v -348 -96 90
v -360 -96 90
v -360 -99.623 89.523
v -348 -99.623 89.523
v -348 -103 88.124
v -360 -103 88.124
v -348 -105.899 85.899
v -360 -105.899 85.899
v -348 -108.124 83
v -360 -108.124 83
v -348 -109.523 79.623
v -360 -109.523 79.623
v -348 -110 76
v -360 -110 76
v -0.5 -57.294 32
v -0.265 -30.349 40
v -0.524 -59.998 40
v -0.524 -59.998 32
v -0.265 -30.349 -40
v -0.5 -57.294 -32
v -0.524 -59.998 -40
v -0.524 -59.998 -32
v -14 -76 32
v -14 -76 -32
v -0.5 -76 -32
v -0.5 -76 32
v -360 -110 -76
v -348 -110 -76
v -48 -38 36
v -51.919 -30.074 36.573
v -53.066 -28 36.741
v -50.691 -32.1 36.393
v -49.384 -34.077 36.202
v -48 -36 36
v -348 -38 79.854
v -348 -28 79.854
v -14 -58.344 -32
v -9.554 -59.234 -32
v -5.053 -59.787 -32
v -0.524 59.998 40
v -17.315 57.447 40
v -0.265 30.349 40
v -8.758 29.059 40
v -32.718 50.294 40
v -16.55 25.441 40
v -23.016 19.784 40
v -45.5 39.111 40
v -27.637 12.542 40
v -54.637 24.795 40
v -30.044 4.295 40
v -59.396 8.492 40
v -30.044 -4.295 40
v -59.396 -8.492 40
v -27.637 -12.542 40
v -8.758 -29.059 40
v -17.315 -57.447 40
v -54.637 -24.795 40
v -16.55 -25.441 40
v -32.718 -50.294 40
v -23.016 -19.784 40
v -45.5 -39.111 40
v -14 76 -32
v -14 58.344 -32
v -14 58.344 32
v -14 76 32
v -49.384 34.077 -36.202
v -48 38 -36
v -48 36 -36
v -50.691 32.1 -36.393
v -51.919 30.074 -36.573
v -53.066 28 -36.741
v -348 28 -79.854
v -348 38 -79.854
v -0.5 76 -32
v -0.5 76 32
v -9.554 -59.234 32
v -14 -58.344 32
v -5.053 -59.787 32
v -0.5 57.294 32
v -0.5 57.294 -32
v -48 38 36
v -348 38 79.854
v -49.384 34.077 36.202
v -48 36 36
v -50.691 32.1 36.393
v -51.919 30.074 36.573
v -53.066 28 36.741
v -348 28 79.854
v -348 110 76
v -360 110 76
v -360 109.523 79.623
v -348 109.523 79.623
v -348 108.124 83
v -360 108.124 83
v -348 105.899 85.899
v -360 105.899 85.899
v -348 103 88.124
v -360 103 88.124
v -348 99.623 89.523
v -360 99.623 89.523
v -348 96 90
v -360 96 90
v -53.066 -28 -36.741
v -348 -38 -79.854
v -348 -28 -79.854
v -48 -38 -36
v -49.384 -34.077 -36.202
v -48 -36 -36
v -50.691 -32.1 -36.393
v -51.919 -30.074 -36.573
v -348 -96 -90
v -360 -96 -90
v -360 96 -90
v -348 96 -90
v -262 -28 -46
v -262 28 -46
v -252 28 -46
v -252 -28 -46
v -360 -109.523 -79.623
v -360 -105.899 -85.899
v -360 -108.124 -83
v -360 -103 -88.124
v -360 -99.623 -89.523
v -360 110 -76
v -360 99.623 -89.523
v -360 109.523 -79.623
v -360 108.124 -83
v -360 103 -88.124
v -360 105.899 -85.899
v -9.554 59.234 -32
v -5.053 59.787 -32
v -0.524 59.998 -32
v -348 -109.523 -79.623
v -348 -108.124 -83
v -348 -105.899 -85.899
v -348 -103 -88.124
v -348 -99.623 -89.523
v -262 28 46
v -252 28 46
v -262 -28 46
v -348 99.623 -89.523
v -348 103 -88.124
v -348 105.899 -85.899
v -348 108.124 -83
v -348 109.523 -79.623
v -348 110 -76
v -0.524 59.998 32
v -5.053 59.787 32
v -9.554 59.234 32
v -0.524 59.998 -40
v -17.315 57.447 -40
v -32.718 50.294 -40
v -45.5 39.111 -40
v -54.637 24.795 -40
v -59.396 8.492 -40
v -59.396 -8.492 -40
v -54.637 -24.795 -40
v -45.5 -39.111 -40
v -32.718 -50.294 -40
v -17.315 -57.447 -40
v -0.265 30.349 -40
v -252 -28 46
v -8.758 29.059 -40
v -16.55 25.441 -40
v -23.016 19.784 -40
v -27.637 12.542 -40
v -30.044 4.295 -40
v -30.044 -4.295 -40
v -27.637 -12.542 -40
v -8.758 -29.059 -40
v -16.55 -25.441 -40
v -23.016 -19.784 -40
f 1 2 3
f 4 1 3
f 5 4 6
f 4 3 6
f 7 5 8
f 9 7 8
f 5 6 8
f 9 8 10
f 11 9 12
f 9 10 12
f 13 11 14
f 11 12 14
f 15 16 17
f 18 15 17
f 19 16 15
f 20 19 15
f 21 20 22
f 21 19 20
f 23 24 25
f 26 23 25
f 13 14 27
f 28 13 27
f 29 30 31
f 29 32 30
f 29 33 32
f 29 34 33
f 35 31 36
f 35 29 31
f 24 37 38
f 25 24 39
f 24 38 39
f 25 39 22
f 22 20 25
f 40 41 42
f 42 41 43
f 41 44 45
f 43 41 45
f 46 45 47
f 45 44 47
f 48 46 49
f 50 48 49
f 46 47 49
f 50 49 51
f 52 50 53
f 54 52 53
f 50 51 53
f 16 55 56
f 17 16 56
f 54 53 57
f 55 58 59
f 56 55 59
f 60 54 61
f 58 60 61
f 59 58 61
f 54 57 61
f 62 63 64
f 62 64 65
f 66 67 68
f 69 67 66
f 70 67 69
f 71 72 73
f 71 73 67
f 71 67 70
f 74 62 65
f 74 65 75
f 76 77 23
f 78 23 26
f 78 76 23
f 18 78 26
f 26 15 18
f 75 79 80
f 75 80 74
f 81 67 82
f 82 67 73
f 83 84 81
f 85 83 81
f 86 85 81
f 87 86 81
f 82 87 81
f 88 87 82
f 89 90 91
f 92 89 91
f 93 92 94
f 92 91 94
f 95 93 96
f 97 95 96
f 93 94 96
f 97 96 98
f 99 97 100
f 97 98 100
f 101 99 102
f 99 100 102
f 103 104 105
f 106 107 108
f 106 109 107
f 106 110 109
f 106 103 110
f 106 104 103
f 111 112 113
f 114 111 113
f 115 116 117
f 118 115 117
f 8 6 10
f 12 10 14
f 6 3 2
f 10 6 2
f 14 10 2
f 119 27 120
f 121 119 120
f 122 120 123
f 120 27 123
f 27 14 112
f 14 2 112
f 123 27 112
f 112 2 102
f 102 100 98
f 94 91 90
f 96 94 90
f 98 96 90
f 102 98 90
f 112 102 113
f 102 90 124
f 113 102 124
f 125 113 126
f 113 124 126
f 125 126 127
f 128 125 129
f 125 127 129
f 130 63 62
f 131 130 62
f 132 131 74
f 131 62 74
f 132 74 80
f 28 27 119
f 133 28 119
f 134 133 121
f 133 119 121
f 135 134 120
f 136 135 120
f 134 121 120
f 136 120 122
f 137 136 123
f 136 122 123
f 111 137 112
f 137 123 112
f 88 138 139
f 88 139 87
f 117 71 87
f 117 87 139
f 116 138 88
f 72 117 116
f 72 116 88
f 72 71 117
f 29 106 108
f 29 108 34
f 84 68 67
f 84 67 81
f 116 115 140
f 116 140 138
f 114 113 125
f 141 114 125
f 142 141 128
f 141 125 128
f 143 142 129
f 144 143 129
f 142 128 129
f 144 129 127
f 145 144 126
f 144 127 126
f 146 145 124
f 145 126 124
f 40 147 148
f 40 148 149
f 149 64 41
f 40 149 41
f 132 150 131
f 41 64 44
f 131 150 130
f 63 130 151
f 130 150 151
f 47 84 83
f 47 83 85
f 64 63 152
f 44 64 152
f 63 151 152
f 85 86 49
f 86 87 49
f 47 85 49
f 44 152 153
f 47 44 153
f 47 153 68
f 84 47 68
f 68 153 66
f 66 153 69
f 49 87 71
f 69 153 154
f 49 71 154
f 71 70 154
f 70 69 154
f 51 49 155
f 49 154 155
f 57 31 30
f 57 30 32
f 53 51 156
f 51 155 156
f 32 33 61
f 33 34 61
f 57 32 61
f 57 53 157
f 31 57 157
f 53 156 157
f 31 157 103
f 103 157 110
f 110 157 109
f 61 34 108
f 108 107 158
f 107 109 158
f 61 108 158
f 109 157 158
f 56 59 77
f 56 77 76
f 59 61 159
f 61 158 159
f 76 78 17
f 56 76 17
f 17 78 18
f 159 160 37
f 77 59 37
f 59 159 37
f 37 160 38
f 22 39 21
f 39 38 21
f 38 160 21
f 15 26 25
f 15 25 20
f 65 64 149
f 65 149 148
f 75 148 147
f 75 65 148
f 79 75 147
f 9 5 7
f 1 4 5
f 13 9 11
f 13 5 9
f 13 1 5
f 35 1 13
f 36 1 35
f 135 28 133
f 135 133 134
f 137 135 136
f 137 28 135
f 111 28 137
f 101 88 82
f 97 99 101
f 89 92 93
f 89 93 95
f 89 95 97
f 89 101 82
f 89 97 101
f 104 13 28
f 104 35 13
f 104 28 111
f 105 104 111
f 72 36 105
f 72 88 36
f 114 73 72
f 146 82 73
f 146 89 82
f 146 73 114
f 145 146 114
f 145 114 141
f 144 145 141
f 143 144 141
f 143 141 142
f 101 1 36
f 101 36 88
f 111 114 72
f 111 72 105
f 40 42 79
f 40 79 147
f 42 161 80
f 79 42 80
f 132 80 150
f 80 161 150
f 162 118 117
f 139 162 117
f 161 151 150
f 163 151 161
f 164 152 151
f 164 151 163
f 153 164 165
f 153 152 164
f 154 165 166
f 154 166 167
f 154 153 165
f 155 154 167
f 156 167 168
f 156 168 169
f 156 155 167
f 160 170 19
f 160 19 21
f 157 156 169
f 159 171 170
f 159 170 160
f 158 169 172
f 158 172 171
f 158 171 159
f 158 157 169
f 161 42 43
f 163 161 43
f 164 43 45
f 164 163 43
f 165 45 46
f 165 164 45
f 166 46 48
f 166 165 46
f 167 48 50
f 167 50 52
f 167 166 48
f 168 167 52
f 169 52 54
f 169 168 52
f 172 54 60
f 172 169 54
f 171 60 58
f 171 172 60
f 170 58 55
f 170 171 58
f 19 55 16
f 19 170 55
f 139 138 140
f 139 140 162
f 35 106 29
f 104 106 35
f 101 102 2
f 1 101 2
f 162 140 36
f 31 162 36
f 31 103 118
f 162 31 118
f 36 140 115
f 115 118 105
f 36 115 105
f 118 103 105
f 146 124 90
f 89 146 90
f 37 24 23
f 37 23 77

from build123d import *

# Parameters (mm, degrees)
EXTRUDE_START         = -360
EXTRUDE_1_DEPTH       = 12
EXTRUDE_START_2       = 28
EXTRUDE_2_DEPTH       = 10
EXTRUDE_START_3       = -38
EXTRUDE_3_DEPTH       = 10
EXTRUDE_START_4       = -46
EXTRUDE_SKETCH_4_W    = 10
EXTRUDE_SKETCH_4_H    = 56
EXTRUDE_4_DEPTH       = 92
REVOLVE_PROFILE_1_W   = 29.65
REVOLVE_PROFILE_1_H   = 80
REVOLVE_1_ANGLE       = 179
REVOLVE_INDEX_1_ANGLE = 90.5
EXTRUDE_START_5       = -32
EXTRUDE_SKETCH_5_W    = 13.5
EXTRUDE_SKETCH_5_H    = 20
EXTRUDE_5_DEPTH       = 64
EXTRUDE_SKETCH_6_W    = 13.5
EXTRUDE_SKETCH_6_H    = 20
EXTRUDE_6_DEPTH       = 64


with BuildPart() as part:
    # Extrude sketch 1 → Extrude 1 (new body)
    with BuildSketch(Plane(origin=(0, 0, 0), x_dir=(0, 0, -1), z_dir=(1, 0, 0)).offset(EXTRUDE_START)):
        with BuildLine():
            Line((-90, 96), (-90, -96))
            ThreePointArc((-90, -96), (-85.899494937, -105.899494937), (-76, -110))
            Line((-76, -110), (76, -110))
            ThreePointArc((76, -110), (85.899494937, -105.899494937), (90, -96))
            Line((90, -96), (90, 96))
            ThreePointArc((90, 96), (85.899494937, 105.899494937), (76, 110))
            Line((76, 110), (-76, 110))
            ThreePointArc((-76, 110), (-85.899494937, 105.899494937), (-90, 96))
        make_face()
    extrude(amount=EXTRUDE_1_DEPTH)


with BuildPart() as body_2:
    # Extrude sketch 2 → Extrude 2 (new body)
    with BuildSketch(Plane(origin=(0, 0, 0), x_dir=(1, 0, 0), z_dir=(0, 1, 0)).offset(EXTRUDE_START_2)):
        Polygon((-349, 80), (-48, 36), (-48, -36), (-349, -80), align=None)
    extrude(amount=EXTRUDE_2_DEPTH)


with BuildPart() as body_3:
    # Extrude sketch 3 → Extrude 3 (new body)
    with BuildSketch(Plane(origin=(0, 0, 0), x_dir=(1, 0, 0), z_dir=(0, 1, 0)).offset(EXTRUDE_START_3)):
        Polygon((-349, 80), (-48, 36), (-48, -36), (-349, -80), align=None)
    extrude(amount=EXTRUDE_3_DEPTH)


with BuildPart() as body_4:
    # Extrude sketch 4 → Extrude 4 (new body)
    with BuildSketch(Plane.XY.offset(EXTRUDE_START_4)):
        with Locations((-257, 0)):
            Rectangle(EXTRUDE_SKETCH_4_W, EXTRUDE_SKETCH_4_H)
    extrude(amount=EXTRUDE_4_DEPTH)


with BuildPart() as body_5:
    # Revolve profile 1 → Revolve 1 (revolve)
    with BuildSketch(Plane(origin=(0, 0, 0), x_dir=(1, 0, 0), z_dir=(0, 1, 0))):
        with Locations((45.175, 0)):
            Rectangle(REVOLVE_PROFILE_1_W, REVOLVE_PROFILE_1_H)
    revolve(axis=Axis((0, 0, -45), (0, 0, 1)), revolution_arc=REVOLVE_1_ANGLE)


with BuildPart() as body_5_1:
    # Revolve index 1: moved
    add(body_5.part.rotate(Axis((0, 0, 0), (0, 0, 1)), REVOLVE_INDEX_1_ANGLE))


with BuildPart() as body_6:
    # Extrude sketch 5 → Extrude 5 (new body)
    with BuildSketch(Plane.XY.offset(EXTRUDE_START_5)):
        with Locations((-7.25, 66)):
            Rectangle(EXTRUDE_SKETCH_5_W, EXTRUDE_SKETCH_5_H)
    extrude(amount=EXTRUDE_5_DEPTH)


with BuildPart() as body_7:
    # Extrude sketch 6 → Extrude 6 (new body)
    with BuildSketch(Plane.XY.offset(EXTRUDE_START_5)):
        with Locations((-7.25, -66)):
            Rectangle(EXTRUDE_SKETCH_6_W, EXTRUDE_SKETCH_6_H)
    extrude(amount=EXTRUDE_6_DEPTH)

    # Combine (weld / assembly of features): union body 2, body 5, body 3, body 4, body 6, part
    add(body_2.part)
    add(body_5_1.part)
    add(body_3.part)
    add(body_4.part)
    add(body_6.part)
    add(part.part)


solid = body_7.part
